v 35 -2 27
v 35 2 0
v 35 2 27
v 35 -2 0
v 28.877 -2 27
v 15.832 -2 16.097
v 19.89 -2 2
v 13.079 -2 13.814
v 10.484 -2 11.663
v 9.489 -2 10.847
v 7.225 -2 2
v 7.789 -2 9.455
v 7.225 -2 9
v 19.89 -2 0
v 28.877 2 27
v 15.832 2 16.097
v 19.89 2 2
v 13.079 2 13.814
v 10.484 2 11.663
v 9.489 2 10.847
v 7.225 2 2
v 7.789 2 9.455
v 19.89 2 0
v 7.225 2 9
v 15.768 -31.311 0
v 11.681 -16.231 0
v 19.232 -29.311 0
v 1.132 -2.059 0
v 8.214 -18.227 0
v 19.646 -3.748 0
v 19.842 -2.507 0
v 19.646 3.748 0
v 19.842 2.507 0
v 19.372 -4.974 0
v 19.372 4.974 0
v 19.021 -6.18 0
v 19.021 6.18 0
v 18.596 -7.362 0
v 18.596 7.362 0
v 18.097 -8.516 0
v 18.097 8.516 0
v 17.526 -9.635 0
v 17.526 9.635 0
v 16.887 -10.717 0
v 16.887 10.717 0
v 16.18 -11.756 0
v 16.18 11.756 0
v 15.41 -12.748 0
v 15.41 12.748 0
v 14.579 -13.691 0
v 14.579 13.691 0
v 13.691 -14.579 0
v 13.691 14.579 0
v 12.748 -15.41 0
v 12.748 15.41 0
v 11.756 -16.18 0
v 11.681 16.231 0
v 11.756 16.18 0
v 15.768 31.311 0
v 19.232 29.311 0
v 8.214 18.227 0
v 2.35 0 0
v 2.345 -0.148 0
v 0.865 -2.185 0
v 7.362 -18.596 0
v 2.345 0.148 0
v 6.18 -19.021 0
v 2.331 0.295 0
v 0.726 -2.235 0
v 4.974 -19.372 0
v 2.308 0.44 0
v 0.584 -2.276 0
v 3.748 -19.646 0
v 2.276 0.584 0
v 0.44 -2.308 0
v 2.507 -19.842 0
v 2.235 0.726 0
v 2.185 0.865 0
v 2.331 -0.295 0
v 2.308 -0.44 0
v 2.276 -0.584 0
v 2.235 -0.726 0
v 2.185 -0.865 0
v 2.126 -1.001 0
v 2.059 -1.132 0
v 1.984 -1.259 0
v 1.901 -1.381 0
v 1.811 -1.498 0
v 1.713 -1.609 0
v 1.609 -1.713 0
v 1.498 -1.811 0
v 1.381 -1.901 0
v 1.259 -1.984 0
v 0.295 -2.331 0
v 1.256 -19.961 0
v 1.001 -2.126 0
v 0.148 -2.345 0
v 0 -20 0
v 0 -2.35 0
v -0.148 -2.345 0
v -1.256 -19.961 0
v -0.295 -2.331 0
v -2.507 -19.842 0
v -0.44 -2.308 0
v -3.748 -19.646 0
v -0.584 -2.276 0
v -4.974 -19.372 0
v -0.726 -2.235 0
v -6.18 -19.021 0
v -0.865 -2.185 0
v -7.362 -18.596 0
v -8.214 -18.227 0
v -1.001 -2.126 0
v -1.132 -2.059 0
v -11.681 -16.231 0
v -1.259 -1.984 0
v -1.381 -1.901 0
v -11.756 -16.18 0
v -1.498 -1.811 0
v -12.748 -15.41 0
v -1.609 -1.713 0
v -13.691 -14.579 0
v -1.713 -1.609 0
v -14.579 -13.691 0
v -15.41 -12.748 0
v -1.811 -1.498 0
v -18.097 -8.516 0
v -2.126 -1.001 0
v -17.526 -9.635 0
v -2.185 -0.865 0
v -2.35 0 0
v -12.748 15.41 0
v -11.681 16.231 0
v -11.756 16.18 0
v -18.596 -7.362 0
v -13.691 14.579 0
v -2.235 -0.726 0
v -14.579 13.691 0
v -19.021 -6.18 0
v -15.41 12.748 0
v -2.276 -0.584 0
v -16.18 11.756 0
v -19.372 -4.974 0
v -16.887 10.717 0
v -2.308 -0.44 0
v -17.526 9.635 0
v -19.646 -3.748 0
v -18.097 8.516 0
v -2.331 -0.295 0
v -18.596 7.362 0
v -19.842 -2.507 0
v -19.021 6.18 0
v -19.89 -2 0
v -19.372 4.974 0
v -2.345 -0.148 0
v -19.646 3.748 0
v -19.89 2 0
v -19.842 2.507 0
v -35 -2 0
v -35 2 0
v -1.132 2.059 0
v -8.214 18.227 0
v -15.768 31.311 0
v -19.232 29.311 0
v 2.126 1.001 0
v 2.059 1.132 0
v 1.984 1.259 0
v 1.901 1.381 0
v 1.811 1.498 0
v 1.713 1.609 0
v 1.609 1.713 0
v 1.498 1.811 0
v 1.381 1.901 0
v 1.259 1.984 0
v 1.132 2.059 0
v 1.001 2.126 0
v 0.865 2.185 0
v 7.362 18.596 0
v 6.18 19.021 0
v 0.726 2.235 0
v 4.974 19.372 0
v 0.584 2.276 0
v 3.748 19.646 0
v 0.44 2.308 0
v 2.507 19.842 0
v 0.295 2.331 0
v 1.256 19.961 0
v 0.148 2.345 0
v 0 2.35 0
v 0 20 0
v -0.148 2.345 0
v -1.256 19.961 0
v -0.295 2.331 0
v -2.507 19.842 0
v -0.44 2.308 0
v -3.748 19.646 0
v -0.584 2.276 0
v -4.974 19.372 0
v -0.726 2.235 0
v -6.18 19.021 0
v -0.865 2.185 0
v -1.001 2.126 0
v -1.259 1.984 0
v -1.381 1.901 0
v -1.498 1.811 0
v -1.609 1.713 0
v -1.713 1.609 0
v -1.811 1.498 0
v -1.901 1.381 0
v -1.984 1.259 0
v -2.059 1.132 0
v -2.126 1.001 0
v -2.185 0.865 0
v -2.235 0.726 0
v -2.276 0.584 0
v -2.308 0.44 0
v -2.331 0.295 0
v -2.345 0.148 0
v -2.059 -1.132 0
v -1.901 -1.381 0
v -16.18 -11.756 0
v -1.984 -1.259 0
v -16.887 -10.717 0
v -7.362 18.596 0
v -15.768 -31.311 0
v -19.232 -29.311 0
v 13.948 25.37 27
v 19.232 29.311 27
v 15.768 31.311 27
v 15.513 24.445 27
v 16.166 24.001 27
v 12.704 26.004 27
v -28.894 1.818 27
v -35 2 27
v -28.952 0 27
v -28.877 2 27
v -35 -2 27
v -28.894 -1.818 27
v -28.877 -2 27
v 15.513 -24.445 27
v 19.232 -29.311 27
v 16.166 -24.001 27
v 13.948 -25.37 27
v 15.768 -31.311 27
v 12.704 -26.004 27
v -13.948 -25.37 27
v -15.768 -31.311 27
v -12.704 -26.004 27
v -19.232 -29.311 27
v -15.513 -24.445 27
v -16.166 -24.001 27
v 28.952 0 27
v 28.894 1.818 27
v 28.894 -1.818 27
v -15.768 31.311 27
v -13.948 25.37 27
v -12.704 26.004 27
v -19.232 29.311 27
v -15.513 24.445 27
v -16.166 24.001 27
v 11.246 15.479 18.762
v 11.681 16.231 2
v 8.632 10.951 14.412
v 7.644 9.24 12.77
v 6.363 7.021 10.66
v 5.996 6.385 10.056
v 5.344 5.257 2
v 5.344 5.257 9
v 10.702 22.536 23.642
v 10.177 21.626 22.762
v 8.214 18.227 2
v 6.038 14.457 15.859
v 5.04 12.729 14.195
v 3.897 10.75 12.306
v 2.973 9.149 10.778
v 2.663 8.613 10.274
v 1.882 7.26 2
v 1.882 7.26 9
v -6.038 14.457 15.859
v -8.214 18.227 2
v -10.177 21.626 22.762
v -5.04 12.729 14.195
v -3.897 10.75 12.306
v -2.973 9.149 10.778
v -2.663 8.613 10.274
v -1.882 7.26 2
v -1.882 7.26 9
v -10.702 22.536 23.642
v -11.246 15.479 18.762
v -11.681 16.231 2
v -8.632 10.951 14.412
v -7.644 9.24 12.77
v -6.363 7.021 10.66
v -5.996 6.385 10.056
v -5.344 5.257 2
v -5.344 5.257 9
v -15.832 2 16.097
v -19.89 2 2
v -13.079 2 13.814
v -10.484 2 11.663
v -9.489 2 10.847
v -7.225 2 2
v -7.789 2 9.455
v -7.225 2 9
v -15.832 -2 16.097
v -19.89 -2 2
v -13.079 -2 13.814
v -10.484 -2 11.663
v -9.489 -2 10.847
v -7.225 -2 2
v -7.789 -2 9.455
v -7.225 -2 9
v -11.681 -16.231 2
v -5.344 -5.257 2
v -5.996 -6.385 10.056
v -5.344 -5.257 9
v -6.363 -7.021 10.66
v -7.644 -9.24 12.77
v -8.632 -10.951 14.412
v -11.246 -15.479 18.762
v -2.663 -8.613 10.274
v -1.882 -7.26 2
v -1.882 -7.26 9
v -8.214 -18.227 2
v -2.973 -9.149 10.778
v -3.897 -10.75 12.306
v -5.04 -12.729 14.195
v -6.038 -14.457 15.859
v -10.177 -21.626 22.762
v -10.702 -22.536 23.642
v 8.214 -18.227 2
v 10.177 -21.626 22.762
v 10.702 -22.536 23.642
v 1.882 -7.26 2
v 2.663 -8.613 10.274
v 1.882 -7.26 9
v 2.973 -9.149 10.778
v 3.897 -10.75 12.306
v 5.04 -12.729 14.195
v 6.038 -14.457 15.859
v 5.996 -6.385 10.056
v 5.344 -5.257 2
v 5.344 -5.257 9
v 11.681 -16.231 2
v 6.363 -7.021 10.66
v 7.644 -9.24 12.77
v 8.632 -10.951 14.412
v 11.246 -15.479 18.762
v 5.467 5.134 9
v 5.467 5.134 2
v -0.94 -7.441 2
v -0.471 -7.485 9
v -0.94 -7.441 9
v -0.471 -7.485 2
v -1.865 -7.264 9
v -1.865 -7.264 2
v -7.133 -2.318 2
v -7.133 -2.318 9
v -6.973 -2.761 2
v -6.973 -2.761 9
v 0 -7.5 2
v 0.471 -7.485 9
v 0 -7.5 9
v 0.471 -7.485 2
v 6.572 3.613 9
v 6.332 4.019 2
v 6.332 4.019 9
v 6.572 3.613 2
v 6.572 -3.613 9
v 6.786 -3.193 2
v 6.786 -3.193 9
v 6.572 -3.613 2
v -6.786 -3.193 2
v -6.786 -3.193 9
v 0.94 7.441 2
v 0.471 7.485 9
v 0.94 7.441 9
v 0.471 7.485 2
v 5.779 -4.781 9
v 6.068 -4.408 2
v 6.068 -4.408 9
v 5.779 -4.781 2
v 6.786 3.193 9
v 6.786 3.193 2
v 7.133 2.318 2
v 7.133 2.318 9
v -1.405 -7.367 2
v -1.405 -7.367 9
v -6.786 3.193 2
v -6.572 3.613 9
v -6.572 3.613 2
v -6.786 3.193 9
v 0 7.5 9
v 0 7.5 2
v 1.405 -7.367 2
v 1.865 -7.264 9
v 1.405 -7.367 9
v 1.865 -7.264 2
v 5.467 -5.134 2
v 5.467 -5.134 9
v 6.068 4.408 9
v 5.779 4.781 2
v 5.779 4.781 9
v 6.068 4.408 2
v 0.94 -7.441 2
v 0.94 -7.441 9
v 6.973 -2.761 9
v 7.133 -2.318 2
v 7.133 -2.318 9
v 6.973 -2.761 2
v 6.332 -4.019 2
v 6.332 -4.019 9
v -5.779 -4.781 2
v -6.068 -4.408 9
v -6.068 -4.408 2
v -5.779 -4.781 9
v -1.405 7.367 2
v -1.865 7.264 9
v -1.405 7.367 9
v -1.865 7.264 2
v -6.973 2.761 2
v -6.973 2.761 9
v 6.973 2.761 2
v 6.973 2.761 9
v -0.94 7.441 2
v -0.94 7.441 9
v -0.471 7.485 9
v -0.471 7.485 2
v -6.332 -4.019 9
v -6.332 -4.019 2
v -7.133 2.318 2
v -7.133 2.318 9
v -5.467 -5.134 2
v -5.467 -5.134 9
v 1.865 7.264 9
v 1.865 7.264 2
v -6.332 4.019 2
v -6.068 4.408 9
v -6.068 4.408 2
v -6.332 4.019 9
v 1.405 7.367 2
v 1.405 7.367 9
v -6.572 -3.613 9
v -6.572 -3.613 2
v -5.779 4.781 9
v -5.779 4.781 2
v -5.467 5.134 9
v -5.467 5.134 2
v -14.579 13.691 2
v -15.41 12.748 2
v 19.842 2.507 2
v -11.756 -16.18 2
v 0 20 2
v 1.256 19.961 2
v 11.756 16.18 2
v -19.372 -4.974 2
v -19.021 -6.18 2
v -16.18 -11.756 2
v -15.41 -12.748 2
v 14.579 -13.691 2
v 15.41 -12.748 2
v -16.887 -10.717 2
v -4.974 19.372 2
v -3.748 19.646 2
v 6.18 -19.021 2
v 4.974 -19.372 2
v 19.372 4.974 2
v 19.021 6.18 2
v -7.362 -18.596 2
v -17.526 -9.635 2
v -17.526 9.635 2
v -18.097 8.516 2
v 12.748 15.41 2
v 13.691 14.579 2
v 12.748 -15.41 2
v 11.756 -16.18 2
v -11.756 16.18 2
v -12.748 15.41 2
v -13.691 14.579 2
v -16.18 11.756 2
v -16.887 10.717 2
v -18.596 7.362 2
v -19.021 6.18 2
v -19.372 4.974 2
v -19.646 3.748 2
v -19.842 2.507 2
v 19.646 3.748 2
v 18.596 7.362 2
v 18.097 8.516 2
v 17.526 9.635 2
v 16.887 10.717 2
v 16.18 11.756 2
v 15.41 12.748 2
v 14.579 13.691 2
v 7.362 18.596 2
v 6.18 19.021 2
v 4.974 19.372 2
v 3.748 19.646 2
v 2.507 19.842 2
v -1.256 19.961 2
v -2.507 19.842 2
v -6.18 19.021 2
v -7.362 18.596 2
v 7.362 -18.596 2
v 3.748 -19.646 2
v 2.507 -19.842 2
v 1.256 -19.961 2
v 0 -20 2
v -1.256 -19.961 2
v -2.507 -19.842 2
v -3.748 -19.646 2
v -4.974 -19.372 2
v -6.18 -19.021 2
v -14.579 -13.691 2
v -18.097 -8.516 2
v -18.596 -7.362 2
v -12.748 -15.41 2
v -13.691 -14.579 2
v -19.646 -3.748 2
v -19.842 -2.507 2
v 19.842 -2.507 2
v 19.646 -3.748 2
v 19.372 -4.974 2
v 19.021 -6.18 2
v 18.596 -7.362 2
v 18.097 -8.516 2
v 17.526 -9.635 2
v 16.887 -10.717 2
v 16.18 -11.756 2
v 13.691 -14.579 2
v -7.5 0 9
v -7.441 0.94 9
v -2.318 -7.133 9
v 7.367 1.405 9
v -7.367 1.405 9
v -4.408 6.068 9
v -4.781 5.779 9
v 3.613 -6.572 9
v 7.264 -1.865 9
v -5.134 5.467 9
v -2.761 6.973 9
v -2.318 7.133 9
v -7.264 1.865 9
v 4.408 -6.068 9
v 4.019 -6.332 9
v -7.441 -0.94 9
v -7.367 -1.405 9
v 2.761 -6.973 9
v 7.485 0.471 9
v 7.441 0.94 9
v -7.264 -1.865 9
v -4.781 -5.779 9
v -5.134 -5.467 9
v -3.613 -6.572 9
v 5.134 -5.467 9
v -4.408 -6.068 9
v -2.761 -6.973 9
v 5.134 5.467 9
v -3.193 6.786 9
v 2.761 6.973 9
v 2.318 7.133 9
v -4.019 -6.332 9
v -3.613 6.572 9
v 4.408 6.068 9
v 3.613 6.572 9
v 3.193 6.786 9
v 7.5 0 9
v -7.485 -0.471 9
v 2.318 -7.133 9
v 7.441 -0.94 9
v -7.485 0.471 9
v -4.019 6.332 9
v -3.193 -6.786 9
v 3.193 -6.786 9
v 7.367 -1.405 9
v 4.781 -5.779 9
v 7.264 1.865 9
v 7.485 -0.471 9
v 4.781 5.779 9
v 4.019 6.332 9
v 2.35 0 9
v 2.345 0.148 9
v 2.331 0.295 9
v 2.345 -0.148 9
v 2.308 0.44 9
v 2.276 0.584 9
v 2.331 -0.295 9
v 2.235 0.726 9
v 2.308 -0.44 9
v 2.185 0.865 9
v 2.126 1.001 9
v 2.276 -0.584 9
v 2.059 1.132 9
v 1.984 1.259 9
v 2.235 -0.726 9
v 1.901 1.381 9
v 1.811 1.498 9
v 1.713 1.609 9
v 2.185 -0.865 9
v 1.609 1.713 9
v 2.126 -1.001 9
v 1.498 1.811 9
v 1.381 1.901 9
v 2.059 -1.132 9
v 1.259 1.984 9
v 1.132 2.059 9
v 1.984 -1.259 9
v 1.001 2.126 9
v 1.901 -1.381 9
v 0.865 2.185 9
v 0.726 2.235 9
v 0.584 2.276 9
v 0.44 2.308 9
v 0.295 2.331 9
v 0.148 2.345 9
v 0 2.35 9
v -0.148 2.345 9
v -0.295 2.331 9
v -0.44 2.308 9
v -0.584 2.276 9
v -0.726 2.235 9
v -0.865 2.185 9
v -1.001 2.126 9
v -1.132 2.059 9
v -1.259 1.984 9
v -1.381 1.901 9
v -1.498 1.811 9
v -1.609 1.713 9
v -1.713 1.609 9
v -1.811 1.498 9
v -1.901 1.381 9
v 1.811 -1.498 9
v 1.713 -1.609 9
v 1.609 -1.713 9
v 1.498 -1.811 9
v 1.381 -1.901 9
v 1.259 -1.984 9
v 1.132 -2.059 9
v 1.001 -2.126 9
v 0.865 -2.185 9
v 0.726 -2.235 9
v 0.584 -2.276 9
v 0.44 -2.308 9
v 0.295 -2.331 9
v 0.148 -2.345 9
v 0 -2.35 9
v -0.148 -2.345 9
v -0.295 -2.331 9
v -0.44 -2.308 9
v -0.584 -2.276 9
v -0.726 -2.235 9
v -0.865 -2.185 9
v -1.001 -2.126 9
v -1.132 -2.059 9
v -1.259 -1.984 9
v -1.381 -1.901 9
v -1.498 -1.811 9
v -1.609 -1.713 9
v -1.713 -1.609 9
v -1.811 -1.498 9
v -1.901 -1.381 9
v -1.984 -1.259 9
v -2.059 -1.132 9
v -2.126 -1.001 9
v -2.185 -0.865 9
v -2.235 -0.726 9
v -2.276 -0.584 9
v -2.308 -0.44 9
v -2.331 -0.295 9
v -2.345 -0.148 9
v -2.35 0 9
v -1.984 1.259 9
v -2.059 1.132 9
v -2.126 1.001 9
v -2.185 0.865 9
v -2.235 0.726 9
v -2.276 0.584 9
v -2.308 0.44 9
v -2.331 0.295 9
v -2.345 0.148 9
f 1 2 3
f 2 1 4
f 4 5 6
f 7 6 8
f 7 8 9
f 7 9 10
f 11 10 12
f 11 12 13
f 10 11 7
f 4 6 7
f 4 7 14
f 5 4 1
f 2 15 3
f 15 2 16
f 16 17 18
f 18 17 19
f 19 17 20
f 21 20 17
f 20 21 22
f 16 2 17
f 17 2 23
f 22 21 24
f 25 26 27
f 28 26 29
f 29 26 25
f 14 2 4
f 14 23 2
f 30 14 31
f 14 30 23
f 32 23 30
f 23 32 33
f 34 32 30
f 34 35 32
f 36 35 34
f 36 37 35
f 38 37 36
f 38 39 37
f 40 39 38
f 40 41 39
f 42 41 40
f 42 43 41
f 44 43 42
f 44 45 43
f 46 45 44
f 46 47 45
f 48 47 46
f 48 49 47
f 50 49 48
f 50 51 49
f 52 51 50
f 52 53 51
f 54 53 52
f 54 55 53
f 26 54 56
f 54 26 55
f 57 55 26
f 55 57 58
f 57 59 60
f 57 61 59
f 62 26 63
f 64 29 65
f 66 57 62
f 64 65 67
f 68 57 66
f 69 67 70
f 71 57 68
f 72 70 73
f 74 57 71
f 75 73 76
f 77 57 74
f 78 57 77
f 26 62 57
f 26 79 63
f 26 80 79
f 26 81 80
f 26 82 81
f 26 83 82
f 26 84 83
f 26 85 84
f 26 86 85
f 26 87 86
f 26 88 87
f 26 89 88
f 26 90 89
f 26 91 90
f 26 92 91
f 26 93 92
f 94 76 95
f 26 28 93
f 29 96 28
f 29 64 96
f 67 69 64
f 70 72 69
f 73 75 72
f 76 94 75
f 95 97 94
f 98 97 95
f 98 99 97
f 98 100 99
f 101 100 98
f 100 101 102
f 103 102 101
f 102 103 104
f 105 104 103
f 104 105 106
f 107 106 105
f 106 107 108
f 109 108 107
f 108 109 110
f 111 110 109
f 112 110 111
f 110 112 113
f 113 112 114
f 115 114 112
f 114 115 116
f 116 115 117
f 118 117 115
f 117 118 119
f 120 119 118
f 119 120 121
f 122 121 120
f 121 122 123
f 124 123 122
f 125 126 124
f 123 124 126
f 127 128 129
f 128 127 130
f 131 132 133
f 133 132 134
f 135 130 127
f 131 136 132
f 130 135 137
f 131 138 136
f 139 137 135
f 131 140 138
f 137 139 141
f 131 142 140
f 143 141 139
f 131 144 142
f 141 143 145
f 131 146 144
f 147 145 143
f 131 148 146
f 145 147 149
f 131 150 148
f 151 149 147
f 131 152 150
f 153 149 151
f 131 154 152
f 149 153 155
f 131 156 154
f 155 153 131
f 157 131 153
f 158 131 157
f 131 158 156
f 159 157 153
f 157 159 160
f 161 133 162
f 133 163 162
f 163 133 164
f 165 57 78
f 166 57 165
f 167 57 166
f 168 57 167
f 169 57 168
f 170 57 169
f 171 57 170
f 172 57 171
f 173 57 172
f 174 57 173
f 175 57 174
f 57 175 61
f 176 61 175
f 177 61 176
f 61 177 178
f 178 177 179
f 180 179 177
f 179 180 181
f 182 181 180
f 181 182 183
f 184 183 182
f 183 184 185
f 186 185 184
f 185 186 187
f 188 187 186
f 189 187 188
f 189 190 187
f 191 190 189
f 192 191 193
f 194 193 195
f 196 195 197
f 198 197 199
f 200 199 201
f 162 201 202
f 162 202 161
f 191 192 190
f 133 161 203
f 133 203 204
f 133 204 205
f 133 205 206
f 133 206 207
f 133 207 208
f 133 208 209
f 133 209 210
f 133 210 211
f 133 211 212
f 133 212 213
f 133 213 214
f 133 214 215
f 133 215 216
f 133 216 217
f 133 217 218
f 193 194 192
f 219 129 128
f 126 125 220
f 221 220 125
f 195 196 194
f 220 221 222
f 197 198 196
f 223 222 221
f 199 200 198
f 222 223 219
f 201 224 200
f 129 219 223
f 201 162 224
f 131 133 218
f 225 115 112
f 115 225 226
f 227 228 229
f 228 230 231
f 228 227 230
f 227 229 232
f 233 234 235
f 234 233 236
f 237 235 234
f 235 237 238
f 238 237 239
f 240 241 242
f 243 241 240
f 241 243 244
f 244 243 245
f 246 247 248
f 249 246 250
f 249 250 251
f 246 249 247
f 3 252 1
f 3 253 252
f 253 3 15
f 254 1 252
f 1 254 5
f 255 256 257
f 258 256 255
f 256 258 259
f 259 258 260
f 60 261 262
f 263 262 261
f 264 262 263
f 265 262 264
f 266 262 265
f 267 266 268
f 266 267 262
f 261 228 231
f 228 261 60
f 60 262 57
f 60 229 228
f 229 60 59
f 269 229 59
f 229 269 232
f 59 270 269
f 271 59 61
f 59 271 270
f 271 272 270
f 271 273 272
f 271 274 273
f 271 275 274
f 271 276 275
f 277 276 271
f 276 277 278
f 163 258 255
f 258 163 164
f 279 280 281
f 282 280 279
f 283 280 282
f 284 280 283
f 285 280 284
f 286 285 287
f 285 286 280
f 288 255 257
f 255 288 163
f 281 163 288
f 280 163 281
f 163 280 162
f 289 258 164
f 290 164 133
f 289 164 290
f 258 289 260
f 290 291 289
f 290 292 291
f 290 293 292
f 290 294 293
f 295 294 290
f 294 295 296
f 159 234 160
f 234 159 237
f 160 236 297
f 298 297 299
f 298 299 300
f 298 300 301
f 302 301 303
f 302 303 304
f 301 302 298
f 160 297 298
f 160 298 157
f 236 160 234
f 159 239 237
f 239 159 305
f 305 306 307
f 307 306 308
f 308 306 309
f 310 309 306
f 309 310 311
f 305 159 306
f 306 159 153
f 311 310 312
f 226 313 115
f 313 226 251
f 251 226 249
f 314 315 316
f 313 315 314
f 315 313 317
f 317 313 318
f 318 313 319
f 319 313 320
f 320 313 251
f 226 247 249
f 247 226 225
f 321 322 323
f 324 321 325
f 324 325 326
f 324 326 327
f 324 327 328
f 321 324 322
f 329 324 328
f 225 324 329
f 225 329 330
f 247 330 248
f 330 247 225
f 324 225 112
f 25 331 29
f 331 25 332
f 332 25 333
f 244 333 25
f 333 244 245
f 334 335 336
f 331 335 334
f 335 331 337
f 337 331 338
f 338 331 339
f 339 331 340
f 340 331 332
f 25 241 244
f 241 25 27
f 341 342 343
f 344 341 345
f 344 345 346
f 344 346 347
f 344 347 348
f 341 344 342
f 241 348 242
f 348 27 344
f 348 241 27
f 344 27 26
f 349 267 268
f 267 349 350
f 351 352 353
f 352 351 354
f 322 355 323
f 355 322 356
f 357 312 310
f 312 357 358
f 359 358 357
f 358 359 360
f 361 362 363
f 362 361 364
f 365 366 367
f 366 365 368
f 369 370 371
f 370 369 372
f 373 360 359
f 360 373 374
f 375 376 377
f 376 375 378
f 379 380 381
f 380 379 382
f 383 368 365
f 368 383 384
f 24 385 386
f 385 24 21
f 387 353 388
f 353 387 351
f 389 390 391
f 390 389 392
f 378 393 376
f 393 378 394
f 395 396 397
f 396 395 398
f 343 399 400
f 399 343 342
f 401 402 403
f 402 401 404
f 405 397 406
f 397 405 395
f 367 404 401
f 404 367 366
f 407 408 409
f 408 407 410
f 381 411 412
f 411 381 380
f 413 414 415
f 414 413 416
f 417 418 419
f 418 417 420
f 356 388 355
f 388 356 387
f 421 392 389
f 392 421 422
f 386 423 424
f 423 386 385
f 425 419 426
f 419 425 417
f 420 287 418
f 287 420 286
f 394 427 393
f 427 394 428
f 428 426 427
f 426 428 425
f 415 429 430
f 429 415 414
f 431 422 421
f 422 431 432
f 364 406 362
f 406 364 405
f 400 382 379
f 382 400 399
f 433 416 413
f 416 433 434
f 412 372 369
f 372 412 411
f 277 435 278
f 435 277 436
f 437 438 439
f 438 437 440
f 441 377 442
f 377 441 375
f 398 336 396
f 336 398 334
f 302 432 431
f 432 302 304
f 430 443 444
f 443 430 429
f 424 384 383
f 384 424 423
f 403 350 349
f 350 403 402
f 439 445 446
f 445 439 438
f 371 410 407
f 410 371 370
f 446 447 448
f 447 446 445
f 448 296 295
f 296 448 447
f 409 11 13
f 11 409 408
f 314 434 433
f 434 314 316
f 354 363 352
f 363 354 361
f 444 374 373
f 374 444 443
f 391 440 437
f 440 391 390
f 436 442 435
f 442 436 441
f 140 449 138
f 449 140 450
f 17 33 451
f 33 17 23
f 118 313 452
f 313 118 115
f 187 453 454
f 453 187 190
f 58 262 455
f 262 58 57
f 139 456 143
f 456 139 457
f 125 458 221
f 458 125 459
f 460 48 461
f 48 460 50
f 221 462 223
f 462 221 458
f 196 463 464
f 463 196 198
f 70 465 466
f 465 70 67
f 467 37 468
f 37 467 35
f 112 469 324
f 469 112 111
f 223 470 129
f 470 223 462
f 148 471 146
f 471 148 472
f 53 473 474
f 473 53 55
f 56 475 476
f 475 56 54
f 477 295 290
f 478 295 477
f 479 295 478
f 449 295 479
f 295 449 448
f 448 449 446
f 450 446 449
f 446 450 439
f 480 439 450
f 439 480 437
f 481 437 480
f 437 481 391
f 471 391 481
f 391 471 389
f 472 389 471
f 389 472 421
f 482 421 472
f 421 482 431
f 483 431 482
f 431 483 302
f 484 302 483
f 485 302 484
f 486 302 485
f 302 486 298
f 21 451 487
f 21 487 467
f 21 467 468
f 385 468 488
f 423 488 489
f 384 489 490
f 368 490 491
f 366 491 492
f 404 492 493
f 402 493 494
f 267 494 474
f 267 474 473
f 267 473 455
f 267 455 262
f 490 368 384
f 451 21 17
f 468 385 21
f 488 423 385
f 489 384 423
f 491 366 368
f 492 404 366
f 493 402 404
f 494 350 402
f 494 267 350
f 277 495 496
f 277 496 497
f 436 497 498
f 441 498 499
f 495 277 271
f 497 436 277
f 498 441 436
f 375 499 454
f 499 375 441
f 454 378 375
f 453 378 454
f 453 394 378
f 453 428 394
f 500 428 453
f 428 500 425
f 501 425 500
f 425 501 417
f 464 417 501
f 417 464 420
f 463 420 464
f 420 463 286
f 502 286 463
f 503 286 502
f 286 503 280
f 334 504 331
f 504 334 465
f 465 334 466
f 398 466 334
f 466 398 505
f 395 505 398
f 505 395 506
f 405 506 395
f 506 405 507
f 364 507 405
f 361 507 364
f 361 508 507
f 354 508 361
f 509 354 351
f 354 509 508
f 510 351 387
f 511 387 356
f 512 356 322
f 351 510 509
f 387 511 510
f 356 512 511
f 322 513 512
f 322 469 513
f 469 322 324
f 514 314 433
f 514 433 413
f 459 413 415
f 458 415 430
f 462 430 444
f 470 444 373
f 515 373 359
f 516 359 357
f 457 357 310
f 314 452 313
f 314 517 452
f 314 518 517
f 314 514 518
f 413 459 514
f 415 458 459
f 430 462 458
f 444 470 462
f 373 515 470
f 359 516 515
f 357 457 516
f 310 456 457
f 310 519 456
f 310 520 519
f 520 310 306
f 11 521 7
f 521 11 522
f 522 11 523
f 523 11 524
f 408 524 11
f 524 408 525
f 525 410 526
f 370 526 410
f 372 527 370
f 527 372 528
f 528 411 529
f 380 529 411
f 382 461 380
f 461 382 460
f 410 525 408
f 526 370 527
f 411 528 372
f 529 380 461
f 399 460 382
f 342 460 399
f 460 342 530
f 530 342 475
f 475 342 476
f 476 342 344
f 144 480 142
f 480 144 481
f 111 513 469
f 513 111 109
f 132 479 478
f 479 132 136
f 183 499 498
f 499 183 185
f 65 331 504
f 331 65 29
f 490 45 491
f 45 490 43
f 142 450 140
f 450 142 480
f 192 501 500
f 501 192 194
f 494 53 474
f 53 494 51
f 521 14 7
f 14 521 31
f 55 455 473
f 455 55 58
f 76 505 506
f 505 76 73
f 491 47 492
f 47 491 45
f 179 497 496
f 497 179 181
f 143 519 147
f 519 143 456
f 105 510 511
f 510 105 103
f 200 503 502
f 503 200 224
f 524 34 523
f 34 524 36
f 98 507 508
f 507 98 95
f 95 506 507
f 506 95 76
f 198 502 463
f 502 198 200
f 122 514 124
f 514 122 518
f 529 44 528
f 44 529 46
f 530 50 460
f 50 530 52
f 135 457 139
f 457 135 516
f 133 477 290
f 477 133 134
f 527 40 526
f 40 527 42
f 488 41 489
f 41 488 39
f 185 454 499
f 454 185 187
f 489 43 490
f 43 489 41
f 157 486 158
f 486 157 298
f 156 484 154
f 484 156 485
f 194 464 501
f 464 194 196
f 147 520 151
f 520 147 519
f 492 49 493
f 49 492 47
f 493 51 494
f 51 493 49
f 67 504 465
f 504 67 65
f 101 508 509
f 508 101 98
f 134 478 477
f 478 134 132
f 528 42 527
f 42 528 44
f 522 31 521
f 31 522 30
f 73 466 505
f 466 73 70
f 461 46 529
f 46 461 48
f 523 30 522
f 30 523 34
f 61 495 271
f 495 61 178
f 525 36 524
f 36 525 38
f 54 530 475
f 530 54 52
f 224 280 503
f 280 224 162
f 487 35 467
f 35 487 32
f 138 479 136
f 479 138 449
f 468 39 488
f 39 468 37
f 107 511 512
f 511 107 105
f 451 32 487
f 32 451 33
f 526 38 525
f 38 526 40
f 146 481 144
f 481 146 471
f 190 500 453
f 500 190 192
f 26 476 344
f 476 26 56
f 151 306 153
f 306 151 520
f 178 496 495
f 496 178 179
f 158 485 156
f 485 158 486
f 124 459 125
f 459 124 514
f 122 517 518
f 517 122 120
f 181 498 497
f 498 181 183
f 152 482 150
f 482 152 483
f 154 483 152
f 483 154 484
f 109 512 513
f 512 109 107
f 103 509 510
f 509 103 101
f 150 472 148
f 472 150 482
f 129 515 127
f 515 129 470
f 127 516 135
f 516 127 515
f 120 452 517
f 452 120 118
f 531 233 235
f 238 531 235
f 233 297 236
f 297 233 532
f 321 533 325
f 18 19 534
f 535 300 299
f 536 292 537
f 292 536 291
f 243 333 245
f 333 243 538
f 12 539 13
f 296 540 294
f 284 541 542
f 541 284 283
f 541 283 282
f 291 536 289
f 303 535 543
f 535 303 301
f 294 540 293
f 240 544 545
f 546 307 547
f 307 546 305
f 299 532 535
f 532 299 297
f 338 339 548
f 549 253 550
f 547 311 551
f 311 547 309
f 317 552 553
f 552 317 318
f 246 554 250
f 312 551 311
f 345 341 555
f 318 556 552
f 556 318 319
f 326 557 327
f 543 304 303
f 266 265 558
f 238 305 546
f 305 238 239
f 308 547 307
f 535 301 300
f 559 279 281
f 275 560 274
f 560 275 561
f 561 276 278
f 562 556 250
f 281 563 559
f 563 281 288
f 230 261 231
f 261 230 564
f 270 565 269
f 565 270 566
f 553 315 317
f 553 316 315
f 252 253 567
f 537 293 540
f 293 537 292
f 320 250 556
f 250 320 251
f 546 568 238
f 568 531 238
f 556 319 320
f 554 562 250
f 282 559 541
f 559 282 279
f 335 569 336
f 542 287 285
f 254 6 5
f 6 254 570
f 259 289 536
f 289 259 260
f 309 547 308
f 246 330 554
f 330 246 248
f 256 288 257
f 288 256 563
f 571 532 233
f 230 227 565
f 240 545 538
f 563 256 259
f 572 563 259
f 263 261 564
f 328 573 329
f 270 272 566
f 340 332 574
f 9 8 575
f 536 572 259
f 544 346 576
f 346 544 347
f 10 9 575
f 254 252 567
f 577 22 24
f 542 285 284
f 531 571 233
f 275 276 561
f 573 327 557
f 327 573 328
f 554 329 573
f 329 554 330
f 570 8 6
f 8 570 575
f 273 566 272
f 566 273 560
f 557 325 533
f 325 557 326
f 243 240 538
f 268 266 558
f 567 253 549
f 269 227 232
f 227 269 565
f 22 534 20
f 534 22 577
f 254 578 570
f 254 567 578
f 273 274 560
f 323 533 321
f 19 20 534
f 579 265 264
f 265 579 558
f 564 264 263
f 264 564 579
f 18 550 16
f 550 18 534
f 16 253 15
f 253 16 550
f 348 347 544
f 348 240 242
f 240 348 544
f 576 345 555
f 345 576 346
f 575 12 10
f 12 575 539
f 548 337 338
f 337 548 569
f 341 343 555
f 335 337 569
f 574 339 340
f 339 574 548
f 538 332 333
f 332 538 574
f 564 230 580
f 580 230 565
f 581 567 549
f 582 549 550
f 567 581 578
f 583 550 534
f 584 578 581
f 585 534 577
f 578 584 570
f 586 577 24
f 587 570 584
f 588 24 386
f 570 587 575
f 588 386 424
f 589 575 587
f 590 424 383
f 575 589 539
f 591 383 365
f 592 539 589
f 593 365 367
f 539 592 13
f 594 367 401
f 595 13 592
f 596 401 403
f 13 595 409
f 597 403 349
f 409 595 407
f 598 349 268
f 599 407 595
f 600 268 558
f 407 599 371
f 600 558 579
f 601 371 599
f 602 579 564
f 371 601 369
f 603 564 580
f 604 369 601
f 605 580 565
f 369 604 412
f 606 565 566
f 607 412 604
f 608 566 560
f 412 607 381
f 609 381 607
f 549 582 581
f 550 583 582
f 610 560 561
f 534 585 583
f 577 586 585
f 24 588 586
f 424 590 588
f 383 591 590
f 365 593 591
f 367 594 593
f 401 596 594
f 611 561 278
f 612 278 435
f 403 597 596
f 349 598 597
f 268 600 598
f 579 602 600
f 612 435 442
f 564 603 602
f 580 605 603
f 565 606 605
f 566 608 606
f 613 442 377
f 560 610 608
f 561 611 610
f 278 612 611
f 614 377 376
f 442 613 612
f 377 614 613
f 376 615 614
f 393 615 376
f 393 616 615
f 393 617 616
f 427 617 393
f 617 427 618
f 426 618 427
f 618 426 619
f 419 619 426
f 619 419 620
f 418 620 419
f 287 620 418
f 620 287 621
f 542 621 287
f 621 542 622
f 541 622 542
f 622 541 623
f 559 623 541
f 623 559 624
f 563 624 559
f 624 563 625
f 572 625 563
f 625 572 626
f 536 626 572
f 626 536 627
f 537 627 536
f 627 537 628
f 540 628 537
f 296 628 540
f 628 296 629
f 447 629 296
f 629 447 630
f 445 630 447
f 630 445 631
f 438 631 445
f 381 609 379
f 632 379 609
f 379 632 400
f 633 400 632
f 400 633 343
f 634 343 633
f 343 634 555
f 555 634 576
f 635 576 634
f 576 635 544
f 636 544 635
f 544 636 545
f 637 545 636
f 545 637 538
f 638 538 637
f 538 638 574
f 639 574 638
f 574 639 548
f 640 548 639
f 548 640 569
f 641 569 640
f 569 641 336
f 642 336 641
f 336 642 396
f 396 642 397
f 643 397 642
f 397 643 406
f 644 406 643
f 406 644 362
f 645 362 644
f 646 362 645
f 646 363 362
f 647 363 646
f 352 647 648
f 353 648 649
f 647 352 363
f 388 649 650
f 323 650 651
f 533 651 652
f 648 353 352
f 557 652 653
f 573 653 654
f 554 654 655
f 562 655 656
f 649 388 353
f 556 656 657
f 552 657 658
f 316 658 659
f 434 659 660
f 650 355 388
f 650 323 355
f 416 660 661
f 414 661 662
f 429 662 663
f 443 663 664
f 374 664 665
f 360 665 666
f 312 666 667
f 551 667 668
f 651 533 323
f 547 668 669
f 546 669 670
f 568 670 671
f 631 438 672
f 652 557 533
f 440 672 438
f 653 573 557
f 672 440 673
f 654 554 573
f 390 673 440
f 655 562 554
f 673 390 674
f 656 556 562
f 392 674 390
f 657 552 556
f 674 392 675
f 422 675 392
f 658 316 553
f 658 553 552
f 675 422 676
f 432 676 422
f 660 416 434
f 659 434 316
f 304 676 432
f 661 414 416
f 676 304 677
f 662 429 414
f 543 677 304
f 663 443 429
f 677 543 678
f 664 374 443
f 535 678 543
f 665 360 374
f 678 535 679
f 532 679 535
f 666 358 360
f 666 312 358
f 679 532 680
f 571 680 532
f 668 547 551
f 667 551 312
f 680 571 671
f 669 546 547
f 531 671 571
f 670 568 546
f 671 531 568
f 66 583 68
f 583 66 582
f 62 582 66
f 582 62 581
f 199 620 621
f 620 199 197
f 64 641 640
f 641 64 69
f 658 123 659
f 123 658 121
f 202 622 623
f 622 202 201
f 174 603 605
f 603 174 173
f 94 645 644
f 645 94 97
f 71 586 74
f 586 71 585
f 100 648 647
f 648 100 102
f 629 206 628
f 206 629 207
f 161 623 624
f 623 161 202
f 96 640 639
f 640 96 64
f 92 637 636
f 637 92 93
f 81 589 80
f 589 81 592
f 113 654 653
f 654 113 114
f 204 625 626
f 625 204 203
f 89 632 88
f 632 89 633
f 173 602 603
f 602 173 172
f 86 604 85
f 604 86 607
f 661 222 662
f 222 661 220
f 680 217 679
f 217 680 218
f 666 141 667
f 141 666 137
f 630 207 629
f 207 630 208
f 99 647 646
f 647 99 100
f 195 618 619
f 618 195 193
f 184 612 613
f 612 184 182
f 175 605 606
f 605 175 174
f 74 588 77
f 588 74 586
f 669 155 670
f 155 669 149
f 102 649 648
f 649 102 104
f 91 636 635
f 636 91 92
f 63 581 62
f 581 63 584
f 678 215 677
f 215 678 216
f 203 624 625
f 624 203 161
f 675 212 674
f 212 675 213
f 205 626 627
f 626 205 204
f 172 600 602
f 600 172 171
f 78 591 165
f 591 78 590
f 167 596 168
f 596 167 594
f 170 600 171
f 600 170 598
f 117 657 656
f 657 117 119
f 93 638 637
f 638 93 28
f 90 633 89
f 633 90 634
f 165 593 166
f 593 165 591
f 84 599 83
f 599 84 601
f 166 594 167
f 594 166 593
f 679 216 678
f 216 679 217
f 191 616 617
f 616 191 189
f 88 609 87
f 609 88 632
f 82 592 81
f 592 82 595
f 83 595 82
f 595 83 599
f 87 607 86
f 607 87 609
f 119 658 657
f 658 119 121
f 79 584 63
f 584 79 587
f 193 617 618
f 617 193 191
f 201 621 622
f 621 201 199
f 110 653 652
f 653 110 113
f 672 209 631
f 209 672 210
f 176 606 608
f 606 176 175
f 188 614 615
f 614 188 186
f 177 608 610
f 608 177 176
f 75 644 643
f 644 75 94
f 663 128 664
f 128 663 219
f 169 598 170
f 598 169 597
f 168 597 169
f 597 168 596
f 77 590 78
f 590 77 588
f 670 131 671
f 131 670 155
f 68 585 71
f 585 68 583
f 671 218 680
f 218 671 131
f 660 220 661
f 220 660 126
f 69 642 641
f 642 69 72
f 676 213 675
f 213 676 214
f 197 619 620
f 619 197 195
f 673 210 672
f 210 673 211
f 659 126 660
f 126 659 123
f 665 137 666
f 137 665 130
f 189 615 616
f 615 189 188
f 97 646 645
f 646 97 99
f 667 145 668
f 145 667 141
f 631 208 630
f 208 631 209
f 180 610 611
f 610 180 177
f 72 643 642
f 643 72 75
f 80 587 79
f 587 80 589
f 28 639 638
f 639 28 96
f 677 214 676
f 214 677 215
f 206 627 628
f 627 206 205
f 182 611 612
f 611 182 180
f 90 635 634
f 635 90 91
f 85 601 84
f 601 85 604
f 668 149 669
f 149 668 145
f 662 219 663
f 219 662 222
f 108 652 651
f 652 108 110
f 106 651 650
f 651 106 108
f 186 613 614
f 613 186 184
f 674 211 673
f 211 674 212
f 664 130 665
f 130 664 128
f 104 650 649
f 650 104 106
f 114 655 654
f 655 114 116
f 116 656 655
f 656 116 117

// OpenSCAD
/*
    Modified from https://www.printables.com/model/517025-impeller-open-radial-blade/files
*/

$fn = 100;  // Number of fragments used to approximate circles

// Parameters
bladeCount = 6;          // Number of blades
bladeThickness = 4;       // Thickness of each blade
impellerDiameter = 70;    // Diameter of the impeller
impellerThickness = 27;
hubRadius = 7.5;         // Radius of the hub
shaftDiameter = 4.7;
shroudThickness = 2;
shroudDiameter = 40;
hubRelief = 18;
reliefAngle = 50;
hubOnly = false;

module __end_of_customizer_variables() {}

impellerRadius = impellerDiameter / 2;    // Radius of the impeller
shroudRadius = shroudDiameter / 2;    // Radius of the shroud

module Blade() {
    translate([0,bladeThickness/2,0])
    rotate([90,0,0])
    cube([impellerRadius, impellerThickness, bladeThickness], center=false);
}


module Impeller() {
    union()
    for (i = [0:bladeCount-1]) {
        rotate([0, 0, i*360/bladeCount])
        Blade();
    }
}

module hub() {
    translate([0,0,impellerThickness/2])
        cylinder(h=impellerThickness, r=hubRadius, center=true);
}

module shaft() {
    translate([0,0,impellerThickness/2])
    cylinder(h=impellerThickness, r=shaftDiameter/2, center=true);
}
module shroud() {
    translate([0,0,shroudThickness/2]){
        cylinder(h=shroudThickness, r=shroudRadius, center=true);
    }
}

module hubReliefCutout() {
    rotate_extrude()
    translate([hubRadius, impellerThickness-hubRelief, 0])
    polygon([[0,0],[-hubRadius, 0],[-hubRadius,hubRelief],[tan(reliefAngle)*hubRelief,hubRelief]
                ]);
}

intersection(){
    if (hubOnly) {hub();}
    difference(){
        union(){
            Impeller(); hub(); shroud();
        }
        {
            union(){
                hubReliefCutout();
                shaft();
            }
        }
    }
}
